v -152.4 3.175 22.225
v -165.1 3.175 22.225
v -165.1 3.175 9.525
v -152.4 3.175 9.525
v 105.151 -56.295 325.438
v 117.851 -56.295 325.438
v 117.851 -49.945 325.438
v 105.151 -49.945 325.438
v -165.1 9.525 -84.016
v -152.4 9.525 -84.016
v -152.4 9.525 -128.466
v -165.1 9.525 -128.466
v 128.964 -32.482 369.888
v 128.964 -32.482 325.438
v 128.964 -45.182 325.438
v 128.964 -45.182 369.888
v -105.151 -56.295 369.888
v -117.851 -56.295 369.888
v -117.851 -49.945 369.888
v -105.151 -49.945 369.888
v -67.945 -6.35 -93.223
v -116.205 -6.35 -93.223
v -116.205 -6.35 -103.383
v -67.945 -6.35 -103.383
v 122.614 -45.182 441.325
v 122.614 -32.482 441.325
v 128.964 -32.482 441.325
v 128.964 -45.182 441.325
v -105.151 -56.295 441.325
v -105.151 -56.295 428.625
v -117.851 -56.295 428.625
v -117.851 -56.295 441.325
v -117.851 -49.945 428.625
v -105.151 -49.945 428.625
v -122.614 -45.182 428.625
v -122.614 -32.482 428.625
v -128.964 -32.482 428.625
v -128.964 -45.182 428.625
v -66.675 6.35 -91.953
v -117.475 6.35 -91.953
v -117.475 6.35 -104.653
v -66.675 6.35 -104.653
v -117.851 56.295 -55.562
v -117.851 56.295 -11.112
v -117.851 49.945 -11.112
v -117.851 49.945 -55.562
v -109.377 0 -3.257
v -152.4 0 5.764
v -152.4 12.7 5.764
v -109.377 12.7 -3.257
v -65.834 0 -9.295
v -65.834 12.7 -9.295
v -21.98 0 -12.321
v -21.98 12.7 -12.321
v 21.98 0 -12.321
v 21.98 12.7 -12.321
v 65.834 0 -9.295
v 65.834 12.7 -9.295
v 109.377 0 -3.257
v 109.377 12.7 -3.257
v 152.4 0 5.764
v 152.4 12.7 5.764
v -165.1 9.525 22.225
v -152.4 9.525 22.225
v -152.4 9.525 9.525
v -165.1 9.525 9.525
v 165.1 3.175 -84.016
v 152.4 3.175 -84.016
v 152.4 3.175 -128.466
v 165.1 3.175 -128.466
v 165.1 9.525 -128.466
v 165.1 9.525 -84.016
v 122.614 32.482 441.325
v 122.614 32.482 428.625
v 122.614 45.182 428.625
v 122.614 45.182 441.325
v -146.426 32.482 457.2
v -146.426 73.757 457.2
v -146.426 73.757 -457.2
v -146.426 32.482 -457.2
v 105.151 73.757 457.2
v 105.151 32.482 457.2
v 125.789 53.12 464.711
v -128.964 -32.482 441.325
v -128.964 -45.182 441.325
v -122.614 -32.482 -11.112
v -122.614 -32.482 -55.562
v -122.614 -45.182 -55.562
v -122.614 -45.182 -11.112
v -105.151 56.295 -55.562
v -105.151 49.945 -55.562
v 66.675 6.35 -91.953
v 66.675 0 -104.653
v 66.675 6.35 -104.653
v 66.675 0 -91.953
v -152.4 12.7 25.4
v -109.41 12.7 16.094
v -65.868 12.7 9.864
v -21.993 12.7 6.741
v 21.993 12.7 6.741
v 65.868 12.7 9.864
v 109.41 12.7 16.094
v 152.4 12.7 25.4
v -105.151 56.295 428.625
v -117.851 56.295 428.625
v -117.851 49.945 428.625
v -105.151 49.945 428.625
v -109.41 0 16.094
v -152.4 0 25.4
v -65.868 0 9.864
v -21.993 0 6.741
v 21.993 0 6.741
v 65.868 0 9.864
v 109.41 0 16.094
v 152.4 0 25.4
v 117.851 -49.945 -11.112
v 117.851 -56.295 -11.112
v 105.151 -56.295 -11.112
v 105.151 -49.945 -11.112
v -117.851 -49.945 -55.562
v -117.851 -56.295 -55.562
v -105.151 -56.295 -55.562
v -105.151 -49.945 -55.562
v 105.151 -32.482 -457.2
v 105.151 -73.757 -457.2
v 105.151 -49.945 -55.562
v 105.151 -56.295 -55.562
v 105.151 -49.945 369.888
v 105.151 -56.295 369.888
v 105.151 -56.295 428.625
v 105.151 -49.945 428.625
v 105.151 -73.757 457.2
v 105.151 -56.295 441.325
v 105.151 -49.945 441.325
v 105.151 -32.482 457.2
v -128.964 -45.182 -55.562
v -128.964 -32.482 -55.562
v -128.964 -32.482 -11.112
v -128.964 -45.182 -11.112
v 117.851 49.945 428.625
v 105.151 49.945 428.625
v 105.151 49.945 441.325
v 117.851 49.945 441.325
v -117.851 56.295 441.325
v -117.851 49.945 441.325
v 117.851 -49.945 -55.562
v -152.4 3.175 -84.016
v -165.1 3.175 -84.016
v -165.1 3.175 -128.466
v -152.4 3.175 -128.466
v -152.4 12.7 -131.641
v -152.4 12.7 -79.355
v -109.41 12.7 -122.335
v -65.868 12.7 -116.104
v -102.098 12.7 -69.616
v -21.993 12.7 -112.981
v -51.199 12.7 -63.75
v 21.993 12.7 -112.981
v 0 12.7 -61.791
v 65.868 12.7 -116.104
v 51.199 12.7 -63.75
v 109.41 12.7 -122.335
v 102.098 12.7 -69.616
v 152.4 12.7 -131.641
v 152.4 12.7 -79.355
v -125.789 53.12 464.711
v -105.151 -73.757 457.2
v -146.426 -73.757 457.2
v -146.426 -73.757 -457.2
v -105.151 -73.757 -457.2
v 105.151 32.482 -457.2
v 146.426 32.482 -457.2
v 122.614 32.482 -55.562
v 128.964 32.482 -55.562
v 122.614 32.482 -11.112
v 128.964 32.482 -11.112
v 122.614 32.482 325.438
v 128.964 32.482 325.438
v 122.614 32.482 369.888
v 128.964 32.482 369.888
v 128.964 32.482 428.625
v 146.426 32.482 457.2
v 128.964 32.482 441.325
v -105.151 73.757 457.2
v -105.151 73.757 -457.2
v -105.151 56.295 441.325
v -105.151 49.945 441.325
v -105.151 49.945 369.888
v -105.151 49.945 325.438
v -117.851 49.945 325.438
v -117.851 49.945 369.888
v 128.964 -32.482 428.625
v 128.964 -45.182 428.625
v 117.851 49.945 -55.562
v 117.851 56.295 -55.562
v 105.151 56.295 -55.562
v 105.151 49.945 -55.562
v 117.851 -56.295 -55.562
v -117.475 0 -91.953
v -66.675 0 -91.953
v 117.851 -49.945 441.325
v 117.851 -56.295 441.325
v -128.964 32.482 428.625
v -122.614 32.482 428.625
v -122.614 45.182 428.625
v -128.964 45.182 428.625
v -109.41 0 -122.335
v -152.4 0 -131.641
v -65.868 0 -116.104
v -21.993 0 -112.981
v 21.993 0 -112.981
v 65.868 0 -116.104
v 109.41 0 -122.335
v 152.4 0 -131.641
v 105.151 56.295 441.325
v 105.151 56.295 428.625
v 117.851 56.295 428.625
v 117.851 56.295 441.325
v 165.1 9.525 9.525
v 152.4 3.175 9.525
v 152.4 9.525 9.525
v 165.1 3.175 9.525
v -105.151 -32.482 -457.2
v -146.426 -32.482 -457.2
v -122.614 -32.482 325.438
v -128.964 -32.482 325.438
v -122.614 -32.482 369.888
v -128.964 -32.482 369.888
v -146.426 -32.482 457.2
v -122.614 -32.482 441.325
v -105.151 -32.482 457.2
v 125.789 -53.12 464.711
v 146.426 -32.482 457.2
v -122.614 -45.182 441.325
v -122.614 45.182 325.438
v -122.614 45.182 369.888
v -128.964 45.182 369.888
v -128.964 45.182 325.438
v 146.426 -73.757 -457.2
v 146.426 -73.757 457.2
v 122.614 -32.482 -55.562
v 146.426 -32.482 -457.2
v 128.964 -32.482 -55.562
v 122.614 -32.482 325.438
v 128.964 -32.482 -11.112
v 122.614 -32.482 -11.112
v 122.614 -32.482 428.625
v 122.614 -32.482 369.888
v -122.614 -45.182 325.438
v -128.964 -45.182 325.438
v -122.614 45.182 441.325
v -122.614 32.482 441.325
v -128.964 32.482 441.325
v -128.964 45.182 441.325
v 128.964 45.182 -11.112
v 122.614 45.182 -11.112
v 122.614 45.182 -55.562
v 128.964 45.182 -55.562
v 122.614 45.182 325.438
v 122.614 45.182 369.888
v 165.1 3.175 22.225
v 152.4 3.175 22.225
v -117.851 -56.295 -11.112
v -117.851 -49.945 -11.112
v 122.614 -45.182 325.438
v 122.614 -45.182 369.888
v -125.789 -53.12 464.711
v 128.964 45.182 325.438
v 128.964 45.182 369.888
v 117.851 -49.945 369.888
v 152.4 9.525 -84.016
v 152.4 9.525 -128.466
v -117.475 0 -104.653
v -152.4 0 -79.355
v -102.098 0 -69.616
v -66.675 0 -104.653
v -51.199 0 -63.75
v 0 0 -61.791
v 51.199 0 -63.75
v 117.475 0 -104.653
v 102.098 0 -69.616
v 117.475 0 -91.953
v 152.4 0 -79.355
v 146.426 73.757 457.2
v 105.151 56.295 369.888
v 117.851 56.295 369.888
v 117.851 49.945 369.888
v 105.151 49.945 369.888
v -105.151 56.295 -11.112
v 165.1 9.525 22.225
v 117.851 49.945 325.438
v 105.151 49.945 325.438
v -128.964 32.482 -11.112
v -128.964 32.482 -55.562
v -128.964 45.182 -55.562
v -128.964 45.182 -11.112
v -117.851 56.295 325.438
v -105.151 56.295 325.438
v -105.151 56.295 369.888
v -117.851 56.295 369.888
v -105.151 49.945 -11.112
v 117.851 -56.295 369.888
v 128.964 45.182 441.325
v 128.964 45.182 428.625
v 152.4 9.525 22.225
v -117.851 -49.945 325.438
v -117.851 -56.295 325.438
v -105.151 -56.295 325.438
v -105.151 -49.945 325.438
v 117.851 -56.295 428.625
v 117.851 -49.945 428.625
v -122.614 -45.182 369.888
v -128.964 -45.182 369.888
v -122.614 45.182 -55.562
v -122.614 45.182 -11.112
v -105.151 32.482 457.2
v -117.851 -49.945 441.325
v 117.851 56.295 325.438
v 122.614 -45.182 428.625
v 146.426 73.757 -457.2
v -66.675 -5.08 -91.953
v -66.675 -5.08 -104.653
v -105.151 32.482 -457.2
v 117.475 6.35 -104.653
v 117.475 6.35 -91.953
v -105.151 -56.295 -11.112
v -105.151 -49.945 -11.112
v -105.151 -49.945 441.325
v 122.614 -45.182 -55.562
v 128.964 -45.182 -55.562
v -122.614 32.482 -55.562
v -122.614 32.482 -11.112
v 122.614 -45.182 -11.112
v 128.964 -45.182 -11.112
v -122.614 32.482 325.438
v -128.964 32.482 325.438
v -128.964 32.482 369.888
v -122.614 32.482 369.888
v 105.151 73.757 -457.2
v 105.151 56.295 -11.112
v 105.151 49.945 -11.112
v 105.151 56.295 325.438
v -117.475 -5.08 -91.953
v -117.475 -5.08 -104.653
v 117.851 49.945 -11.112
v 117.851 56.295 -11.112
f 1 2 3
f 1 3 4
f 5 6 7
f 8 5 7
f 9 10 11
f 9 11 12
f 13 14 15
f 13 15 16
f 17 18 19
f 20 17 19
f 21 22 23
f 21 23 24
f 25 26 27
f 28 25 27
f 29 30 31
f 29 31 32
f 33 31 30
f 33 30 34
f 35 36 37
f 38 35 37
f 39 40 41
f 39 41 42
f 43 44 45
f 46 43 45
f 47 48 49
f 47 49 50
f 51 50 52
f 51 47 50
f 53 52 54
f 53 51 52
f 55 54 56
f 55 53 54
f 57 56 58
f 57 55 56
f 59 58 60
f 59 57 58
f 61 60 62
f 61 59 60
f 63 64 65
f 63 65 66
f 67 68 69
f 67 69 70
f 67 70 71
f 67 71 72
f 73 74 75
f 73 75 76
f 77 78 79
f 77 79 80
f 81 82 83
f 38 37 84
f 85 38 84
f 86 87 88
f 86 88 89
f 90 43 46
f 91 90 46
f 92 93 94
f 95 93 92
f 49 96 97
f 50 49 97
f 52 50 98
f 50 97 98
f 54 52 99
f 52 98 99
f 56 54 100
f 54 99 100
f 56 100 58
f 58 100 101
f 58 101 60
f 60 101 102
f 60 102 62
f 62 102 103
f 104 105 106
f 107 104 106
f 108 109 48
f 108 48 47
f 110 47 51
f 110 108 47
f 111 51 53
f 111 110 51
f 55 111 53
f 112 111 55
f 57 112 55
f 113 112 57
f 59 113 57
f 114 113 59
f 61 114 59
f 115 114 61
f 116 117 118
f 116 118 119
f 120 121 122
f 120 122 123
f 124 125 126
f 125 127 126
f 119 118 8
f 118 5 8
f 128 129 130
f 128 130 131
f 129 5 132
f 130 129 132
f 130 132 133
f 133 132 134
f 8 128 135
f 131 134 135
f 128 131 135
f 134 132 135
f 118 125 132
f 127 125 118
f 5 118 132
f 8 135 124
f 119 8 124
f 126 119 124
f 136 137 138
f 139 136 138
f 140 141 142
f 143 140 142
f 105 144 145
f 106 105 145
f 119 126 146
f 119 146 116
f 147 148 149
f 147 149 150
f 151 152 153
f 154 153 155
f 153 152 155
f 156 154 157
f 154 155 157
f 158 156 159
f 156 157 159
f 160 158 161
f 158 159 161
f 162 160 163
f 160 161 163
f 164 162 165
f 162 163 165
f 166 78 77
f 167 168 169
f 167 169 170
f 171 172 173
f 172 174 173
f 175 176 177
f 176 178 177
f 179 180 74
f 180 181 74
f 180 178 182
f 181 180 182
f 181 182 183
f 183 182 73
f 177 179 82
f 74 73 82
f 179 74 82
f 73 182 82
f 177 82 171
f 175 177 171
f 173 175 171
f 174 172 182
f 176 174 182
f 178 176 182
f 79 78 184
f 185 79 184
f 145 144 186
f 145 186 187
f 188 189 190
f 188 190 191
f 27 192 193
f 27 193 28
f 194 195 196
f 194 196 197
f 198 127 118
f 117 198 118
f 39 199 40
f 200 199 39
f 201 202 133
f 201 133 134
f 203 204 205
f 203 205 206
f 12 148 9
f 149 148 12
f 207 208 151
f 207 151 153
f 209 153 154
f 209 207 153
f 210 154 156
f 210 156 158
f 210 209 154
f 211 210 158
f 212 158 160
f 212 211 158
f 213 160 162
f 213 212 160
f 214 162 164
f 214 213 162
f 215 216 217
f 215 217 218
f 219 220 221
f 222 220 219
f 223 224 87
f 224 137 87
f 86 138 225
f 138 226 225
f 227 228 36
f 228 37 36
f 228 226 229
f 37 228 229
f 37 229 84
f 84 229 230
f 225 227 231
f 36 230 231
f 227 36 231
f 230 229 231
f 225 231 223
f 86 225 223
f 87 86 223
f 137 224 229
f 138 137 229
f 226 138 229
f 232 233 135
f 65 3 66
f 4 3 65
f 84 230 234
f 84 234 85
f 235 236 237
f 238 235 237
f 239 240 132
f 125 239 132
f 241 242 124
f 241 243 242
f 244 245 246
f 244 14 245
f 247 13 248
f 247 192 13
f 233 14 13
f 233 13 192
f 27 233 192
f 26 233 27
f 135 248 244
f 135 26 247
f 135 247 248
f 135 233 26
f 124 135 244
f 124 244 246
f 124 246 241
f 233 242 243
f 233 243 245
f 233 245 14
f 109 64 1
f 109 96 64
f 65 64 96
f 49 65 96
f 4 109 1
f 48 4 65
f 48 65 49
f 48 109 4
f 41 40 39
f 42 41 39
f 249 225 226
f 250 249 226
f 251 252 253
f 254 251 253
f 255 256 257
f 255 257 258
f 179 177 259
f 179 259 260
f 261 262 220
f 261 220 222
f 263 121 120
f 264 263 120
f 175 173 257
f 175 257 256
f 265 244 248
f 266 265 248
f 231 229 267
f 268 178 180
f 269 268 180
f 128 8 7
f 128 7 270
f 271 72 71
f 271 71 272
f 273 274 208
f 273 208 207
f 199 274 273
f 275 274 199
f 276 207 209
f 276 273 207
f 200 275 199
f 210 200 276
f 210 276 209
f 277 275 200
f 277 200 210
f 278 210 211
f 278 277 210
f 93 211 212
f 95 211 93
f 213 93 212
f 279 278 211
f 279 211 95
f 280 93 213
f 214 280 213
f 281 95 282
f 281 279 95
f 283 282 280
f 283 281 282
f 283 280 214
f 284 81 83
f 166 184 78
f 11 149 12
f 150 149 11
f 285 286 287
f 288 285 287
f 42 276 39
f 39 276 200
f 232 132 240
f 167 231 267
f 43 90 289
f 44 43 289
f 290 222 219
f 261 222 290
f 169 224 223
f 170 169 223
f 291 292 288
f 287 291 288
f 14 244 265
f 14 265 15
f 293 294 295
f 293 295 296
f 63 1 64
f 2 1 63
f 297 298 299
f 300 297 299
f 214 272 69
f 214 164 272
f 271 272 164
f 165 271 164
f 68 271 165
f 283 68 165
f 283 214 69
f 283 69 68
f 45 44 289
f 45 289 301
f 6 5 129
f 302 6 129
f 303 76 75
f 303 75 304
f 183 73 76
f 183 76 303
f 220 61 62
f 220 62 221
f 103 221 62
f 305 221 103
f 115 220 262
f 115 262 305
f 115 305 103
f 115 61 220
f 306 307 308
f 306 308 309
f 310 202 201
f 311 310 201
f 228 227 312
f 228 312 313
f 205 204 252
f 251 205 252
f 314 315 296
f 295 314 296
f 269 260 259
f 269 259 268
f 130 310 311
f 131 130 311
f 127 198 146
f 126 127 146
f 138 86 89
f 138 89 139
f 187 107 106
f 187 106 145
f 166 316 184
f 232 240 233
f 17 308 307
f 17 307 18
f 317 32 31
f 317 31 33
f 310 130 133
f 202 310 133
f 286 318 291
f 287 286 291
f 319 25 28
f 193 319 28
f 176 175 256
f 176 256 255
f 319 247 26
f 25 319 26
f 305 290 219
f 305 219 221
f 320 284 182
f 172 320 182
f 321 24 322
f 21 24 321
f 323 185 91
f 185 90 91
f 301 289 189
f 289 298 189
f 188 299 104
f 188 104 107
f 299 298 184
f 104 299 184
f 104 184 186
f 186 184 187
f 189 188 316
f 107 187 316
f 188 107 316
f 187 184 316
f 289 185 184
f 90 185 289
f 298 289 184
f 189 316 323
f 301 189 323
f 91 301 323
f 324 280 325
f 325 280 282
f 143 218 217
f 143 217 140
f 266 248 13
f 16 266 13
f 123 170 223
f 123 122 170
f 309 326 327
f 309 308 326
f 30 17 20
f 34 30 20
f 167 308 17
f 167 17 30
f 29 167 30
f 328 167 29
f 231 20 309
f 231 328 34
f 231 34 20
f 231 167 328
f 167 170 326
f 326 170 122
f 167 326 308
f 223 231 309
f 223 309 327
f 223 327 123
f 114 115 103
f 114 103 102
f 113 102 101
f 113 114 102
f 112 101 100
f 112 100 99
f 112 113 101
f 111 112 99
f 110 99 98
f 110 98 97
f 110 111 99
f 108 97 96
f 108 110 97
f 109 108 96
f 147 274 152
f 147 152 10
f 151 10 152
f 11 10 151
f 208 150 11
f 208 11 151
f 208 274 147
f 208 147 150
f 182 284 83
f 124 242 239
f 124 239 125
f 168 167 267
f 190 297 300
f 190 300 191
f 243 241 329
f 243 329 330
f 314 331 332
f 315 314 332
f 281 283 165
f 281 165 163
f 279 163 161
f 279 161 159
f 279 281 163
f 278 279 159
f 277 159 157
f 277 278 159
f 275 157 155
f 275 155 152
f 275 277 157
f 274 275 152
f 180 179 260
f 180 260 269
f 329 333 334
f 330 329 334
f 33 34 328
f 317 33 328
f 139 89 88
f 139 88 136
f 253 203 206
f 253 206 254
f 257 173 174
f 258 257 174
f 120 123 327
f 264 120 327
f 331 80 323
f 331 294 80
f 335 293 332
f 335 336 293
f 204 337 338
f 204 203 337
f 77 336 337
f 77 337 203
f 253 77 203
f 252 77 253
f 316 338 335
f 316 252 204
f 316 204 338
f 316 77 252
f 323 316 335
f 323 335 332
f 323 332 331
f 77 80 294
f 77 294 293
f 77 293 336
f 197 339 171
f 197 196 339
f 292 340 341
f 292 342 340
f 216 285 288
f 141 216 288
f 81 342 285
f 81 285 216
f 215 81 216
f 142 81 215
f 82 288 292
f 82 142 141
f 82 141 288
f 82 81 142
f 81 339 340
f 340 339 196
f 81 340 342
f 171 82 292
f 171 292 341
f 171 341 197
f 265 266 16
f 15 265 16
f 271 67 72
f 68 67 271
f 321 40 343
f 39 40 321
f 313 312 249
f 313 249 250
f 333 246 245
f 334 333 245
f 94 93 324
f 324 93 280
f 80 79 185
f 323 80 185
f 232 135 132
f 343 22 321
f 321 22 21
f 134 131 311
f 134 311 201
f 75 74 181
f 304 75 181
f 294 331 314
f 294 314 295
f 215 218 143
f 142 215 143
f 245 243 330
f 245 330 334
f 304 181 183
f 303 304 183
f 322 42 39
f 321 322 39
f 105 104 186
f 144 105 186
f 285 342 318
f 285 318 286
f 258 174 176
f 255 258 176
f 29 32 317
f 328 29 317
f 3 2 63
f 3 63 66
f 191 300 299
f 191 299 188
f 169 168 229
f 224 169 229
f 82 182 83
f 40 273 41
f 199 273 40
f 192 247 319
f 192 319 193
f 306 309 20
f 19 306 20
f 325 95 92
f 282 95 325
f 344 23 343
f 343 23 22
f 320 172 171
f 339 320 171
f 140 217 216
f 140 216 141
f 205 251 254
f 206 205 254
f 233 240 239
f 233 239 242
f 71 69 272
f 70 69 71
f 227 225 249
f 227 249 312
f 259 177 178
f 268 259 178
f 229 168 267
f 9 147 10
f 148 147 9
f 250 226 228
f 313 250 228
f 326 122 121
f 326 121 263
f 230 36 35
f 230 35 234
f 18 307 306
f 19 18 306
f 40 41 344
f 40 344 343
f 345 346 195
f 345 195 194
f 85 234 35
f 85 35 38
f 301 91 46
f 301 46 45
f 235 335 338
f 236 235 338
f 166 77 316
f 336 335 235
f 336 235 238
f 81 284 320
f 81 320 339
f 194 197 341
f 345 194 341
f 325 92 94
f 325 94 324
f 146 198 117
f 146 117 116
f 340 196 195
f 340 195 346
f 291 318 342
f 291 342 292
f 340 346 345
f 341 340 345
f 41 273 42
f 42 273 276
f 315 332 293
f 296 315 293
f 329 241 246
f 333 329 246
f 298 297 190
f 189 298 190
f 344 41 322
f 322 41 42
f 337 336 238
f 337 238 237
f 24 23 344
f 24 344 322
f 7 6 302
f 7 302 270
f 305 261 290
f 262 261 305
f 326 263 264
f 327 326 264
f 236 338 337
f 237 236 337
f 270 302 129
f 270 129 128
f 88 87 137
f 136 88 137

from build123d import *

# Parameters (mm, degrees)
F1_DEPTH   = 12.7
F3_DEPTH   = 12.7
F4_W       = 50.8
F4_H       = 12.7
F5_DEPTH   = 6.35
F6_W       = 41.275
F6_H       = 41.275
F7_DEPTH   = 457.2
F7_FACE1_W = 41.275
F7_FACE1_H = 41.275
F9_DEPTH   = 7.9375
F9_TAPER   = 70
F10_W      = 6.35
F10_H      = 12.7
F10_H_2    = 44.45
F12_DEPTH  = 12.7
F11_W      = 12.7
F11_H      = 12.7
F13_DEPTH  = 3.175
F14_W      = 12.7
F14_H      = 12.7
F15_DEPTH  = 3.175
F16_W      = 12.7
F16_H      = 44.45
F17_DEPTH  = 3.175
F18_W      = 12.7
F18_H      = 44.45
F19_DEPTH  = 3.175
F8_W       = 6.35
F8_H       = 12.7
F8_H_2     = 44.45
F20_DEPTH  = 12.7
F23_W      = 50.8
F23_H      = 12.7
F24_DEPTH  = 12.7
F25_SIZE   = 1.27
F26_SIZE   = 2.54


with BuildPart() as f1:
    # F0 (on Front) → F1 (new body)
    with BuildSketch(Plane.XZ):
        with BuildLine():
            Line((-152.4, 22.225), (-165.1, 22.225))
            Line((-165.1, 22.225), (-165.1, 9.525))
            Line((-165.1, 9.525), (-152.4, 9.525))
            Line((-152.4, 9.525), (-152.4, 5.7641233607))
            ThreePointArc((-152.4, 5.7641233607), (0, -12.7), (152.4, 5.7641233607))
            Line((152.4, 5.7641233607), (152.4, 9.525))
            Line((152.4, 9.525), (165.1, 9.525))
            Line((165.1, 9.525), (165.1, 22.225))
            Line((165.1, 22.225), (152.4, 22.225))
            Line((152.4, 22.225), (152.4, 25.4))
            ThreePointArc((152.4, 25.4), (0, 6.35), (-152.4, 25.4))
            Line((-152.4, 25.4), (-152.4, 22.225))
        make_face()
    extrude(amount=-F1_DEPTH)

    # F11 (on face) → F13 (cut)
    with BuildSketch(Plane.XZ):
        with Locations((-158.75, 15.875)):
            Rectangle(F11_W, F11_H)
        with Locations((158.75, 15.875)):
            Rectangle(F11_W, F11_H)
    extrude(amount=-F13_DEPTH, mode=Mode.SUBTRACT)

    # F14 (on face) → F15 (cut)
    with BuildSketch(Plane(origin=(0, 12.7, 0), x_dir=(-1, 0, 0), z_dir=(0, 1, 0))):
        with Locations((-158.75, 15.875)):
            Rectangle(F14_W, F14_H)
        with Locations((158.75, 15.875)):
            Rectangle(F14_W, F14_H)
    extrude(amount=-F15_DEPTH, mode=Mode.SUBTRACT)


with BuildPart() as f3:
    # F2 (on Front) → F3 (new body)
    with BuildSketch(Plane.XZ):
        with BuildLine():
            Line((-152.4, -84.0155451241), (-165.1, -84.0155451241))
            Line((-165.1, -84.0155451241), (-165.1, -128.4655451241))
            Line((-165.1, -128.4655451241), (-152.4, -128.4655451241))
            Line((-152.4, -128.4655451241), (-152.4, -131.6405451241))
            ThreePointArc((-152.4, -131.6405451241), (0, -112.5905451241), (152.4, -131.6405451241))
            Line((152.4, -131.6405451241), (152.4, -128.4655451241))
            Line((152.4, -128.4655451241), (165.1, -128.4655451241))
            Line((165.1, -128.4655451241), (165.1, -84.0155451241))
            Line((165.1, -84.0155451241), (152.4, -84.0155451241))
            Line((152.4, -84.0155451241), (152.4, -79.3554102101))
            ThreePointArc((152.4, -79.3554102101), (0, -61.7905451241), (-152.4, -79.3554102101))
            Line((-152.4, -79.3554102101), (-152.4, -84.0155451241))
        make_face()
    extrude(amount=-F3_DEPTH)

    # F4 (on face) → F5 (cut)
    with BuildSketch(Plane.XZ):
        with Locations((-92.075, -98.3030451241)):
            Rectangle(F4_W, F4_H)
        with Locations((92.075, -98.3030451241)):
            Rectangle(F4_W, F4_H)
    extrude(amount=-F5_DEPTH, mode=Mode.SUBTRACT)

    # F16 (on face) → F17 (cut)
    with BuildSketch(Plane(origin=(0, 12.7, 0), x_dir=(-1, 0, 0), z_dir=(0, 1, 0))):
        with Locations((-158.75, -106.2405451241)):
            Rectangle(F16_W, F16_H)
        with Locations((158.75, -106.2405451241)):
            Rectangle(F16_W, F16_H)
    extrude(amount=-F17_DEPTH, mode=Mode.SUBTRACT)

    # F18 (on face) → F19 (cut)
    with BuildSketch(Plane.XZ):
        with Locations((-158.75, -106.2405451241)):
            Rectangle(F18_W, F18_H)
        with Locations((158.75, -106.2405451241)):
            Rectangle(F18_W, F18_H)
    extrude(amount=-F19_DEPTH, mode=Mode.SUBTRACT)


with BuildPart() as f7:
    # F6 (on Top) → F7 (new body, symmetric)
    with BuildSketch(Plane.XY):
        with Locations((-125.7886141539, -53.1197041273)):
            Rectangle(F6_W, F6_H)
    extrude(amount=F7_DEPTH, both=True)

    # F7_face1 (on face) → F9 (join)
    with BuildSketch(Plane(origin=(-125.7886141539, -53.1197041273, 457.2), x_dir=(1, 0, 0), z_dir=(0, 0, 1))):
        Rectangle(F7_FACE1_W, F7_FACE1_H)
    extrude(amount=F9_DEPTH, taper=F9_TAPER)

    # F10 (on face) → F12 (cut)
    with BuildSketch(Plane(origin=(0, -32.4822041273, 0), x_dir=(-1, 0, 0), z_dir=(0, 1, 0))):
        with Locations((125.7886141539, 434.975)):
            Rectangle(F10_W, F10_H)
        with Locations((125.7886141539, 347.6625)):
            Rectangle(F10_W, F10_H_2)
        with Locations((125.7886141539, -33.3375)):
            Rectangle(F10_W, F10_H_2)
    extrude(amount=-F12_DEPTH, mode=Mode.SUBTRACT)

    # F8 (on face) → F20 (cut)
    with BuildSketch(Plane.YZ.offset(-105.1511141539)):
        with Locations((-53.1197041273, 434.975)):
            Rectangle(F8_W, F8_H)
        with Locations((-53.1197041273, 347.6625)):
            Rectangle(F8_W, F8_H_2)
        with Locations((-53.1197041273, -33.3375)):
            Rectangle(F8_W, F8_H_2)
    extrude(amount=-F20_DEPTH, mode=Mode.SUBTRACT)


with BuildPart() as f21_1:
    # F21: instance of F7
    add(f7.part.mirror(Plane.YZ))


with BuildPart() as f22_1:
    # F22: instance of F21_1
    add(f21_1.part.mirror(Plane.XZ))


with BuildPart() as f22_2:
    # F22: instance of F7
    add(f7.part.mirror(Plane.XZ))


with BuildPart() as f24:
    # F23 (on face) → F24 (new body)
    with BuildSketch(Plane.XZ.offset(-6.35)):
        with Locations((-92.075, -98.3030451241)):
            Rectangle(F23_W, F23_H)
    extrude(amount=F24_DEPTH)

    # F25
    f25_edges = [f24.edges().sort_by_distance(p)[0] for p in [
        (-92.075, -6.35, -91.953045),
        (-117.475, -6.35, -98.303045),
        (-92.075, -6.35, -104.653045),
        (-66.675, -6.35, -98.303045),
    ]]
    chamfer(f25_edges, length=F25_SIZE)


with BuildPart() as f24b:
    # F23 (on face) → F24, piece 2 (new body)
    with BuildSketch(Plane.XZ.offset(-6.35)):
        with Locations((92.075, -98.3030451241)):
            Rectangle(F23_W, F23_H)
    extrude(amount=F24_DEPTH)

    # F26
    f26_edges = [f24b.edges().sort_by_distance(p)[0] for p in [
        (92.075, -6.35, -91.953045),
        (66.675, -6.35, -98.303045),
        (92.075, -6.35, -104.653045),
        (117.475, -6.35, -98.303045),
    ]]
    chamfer(f26_edges, length=F26_SIZE)


solid = Compound([f1.part, f3.part, f7.part, f21_1.part, f22_1.part, f22_2.part, f24.part])
